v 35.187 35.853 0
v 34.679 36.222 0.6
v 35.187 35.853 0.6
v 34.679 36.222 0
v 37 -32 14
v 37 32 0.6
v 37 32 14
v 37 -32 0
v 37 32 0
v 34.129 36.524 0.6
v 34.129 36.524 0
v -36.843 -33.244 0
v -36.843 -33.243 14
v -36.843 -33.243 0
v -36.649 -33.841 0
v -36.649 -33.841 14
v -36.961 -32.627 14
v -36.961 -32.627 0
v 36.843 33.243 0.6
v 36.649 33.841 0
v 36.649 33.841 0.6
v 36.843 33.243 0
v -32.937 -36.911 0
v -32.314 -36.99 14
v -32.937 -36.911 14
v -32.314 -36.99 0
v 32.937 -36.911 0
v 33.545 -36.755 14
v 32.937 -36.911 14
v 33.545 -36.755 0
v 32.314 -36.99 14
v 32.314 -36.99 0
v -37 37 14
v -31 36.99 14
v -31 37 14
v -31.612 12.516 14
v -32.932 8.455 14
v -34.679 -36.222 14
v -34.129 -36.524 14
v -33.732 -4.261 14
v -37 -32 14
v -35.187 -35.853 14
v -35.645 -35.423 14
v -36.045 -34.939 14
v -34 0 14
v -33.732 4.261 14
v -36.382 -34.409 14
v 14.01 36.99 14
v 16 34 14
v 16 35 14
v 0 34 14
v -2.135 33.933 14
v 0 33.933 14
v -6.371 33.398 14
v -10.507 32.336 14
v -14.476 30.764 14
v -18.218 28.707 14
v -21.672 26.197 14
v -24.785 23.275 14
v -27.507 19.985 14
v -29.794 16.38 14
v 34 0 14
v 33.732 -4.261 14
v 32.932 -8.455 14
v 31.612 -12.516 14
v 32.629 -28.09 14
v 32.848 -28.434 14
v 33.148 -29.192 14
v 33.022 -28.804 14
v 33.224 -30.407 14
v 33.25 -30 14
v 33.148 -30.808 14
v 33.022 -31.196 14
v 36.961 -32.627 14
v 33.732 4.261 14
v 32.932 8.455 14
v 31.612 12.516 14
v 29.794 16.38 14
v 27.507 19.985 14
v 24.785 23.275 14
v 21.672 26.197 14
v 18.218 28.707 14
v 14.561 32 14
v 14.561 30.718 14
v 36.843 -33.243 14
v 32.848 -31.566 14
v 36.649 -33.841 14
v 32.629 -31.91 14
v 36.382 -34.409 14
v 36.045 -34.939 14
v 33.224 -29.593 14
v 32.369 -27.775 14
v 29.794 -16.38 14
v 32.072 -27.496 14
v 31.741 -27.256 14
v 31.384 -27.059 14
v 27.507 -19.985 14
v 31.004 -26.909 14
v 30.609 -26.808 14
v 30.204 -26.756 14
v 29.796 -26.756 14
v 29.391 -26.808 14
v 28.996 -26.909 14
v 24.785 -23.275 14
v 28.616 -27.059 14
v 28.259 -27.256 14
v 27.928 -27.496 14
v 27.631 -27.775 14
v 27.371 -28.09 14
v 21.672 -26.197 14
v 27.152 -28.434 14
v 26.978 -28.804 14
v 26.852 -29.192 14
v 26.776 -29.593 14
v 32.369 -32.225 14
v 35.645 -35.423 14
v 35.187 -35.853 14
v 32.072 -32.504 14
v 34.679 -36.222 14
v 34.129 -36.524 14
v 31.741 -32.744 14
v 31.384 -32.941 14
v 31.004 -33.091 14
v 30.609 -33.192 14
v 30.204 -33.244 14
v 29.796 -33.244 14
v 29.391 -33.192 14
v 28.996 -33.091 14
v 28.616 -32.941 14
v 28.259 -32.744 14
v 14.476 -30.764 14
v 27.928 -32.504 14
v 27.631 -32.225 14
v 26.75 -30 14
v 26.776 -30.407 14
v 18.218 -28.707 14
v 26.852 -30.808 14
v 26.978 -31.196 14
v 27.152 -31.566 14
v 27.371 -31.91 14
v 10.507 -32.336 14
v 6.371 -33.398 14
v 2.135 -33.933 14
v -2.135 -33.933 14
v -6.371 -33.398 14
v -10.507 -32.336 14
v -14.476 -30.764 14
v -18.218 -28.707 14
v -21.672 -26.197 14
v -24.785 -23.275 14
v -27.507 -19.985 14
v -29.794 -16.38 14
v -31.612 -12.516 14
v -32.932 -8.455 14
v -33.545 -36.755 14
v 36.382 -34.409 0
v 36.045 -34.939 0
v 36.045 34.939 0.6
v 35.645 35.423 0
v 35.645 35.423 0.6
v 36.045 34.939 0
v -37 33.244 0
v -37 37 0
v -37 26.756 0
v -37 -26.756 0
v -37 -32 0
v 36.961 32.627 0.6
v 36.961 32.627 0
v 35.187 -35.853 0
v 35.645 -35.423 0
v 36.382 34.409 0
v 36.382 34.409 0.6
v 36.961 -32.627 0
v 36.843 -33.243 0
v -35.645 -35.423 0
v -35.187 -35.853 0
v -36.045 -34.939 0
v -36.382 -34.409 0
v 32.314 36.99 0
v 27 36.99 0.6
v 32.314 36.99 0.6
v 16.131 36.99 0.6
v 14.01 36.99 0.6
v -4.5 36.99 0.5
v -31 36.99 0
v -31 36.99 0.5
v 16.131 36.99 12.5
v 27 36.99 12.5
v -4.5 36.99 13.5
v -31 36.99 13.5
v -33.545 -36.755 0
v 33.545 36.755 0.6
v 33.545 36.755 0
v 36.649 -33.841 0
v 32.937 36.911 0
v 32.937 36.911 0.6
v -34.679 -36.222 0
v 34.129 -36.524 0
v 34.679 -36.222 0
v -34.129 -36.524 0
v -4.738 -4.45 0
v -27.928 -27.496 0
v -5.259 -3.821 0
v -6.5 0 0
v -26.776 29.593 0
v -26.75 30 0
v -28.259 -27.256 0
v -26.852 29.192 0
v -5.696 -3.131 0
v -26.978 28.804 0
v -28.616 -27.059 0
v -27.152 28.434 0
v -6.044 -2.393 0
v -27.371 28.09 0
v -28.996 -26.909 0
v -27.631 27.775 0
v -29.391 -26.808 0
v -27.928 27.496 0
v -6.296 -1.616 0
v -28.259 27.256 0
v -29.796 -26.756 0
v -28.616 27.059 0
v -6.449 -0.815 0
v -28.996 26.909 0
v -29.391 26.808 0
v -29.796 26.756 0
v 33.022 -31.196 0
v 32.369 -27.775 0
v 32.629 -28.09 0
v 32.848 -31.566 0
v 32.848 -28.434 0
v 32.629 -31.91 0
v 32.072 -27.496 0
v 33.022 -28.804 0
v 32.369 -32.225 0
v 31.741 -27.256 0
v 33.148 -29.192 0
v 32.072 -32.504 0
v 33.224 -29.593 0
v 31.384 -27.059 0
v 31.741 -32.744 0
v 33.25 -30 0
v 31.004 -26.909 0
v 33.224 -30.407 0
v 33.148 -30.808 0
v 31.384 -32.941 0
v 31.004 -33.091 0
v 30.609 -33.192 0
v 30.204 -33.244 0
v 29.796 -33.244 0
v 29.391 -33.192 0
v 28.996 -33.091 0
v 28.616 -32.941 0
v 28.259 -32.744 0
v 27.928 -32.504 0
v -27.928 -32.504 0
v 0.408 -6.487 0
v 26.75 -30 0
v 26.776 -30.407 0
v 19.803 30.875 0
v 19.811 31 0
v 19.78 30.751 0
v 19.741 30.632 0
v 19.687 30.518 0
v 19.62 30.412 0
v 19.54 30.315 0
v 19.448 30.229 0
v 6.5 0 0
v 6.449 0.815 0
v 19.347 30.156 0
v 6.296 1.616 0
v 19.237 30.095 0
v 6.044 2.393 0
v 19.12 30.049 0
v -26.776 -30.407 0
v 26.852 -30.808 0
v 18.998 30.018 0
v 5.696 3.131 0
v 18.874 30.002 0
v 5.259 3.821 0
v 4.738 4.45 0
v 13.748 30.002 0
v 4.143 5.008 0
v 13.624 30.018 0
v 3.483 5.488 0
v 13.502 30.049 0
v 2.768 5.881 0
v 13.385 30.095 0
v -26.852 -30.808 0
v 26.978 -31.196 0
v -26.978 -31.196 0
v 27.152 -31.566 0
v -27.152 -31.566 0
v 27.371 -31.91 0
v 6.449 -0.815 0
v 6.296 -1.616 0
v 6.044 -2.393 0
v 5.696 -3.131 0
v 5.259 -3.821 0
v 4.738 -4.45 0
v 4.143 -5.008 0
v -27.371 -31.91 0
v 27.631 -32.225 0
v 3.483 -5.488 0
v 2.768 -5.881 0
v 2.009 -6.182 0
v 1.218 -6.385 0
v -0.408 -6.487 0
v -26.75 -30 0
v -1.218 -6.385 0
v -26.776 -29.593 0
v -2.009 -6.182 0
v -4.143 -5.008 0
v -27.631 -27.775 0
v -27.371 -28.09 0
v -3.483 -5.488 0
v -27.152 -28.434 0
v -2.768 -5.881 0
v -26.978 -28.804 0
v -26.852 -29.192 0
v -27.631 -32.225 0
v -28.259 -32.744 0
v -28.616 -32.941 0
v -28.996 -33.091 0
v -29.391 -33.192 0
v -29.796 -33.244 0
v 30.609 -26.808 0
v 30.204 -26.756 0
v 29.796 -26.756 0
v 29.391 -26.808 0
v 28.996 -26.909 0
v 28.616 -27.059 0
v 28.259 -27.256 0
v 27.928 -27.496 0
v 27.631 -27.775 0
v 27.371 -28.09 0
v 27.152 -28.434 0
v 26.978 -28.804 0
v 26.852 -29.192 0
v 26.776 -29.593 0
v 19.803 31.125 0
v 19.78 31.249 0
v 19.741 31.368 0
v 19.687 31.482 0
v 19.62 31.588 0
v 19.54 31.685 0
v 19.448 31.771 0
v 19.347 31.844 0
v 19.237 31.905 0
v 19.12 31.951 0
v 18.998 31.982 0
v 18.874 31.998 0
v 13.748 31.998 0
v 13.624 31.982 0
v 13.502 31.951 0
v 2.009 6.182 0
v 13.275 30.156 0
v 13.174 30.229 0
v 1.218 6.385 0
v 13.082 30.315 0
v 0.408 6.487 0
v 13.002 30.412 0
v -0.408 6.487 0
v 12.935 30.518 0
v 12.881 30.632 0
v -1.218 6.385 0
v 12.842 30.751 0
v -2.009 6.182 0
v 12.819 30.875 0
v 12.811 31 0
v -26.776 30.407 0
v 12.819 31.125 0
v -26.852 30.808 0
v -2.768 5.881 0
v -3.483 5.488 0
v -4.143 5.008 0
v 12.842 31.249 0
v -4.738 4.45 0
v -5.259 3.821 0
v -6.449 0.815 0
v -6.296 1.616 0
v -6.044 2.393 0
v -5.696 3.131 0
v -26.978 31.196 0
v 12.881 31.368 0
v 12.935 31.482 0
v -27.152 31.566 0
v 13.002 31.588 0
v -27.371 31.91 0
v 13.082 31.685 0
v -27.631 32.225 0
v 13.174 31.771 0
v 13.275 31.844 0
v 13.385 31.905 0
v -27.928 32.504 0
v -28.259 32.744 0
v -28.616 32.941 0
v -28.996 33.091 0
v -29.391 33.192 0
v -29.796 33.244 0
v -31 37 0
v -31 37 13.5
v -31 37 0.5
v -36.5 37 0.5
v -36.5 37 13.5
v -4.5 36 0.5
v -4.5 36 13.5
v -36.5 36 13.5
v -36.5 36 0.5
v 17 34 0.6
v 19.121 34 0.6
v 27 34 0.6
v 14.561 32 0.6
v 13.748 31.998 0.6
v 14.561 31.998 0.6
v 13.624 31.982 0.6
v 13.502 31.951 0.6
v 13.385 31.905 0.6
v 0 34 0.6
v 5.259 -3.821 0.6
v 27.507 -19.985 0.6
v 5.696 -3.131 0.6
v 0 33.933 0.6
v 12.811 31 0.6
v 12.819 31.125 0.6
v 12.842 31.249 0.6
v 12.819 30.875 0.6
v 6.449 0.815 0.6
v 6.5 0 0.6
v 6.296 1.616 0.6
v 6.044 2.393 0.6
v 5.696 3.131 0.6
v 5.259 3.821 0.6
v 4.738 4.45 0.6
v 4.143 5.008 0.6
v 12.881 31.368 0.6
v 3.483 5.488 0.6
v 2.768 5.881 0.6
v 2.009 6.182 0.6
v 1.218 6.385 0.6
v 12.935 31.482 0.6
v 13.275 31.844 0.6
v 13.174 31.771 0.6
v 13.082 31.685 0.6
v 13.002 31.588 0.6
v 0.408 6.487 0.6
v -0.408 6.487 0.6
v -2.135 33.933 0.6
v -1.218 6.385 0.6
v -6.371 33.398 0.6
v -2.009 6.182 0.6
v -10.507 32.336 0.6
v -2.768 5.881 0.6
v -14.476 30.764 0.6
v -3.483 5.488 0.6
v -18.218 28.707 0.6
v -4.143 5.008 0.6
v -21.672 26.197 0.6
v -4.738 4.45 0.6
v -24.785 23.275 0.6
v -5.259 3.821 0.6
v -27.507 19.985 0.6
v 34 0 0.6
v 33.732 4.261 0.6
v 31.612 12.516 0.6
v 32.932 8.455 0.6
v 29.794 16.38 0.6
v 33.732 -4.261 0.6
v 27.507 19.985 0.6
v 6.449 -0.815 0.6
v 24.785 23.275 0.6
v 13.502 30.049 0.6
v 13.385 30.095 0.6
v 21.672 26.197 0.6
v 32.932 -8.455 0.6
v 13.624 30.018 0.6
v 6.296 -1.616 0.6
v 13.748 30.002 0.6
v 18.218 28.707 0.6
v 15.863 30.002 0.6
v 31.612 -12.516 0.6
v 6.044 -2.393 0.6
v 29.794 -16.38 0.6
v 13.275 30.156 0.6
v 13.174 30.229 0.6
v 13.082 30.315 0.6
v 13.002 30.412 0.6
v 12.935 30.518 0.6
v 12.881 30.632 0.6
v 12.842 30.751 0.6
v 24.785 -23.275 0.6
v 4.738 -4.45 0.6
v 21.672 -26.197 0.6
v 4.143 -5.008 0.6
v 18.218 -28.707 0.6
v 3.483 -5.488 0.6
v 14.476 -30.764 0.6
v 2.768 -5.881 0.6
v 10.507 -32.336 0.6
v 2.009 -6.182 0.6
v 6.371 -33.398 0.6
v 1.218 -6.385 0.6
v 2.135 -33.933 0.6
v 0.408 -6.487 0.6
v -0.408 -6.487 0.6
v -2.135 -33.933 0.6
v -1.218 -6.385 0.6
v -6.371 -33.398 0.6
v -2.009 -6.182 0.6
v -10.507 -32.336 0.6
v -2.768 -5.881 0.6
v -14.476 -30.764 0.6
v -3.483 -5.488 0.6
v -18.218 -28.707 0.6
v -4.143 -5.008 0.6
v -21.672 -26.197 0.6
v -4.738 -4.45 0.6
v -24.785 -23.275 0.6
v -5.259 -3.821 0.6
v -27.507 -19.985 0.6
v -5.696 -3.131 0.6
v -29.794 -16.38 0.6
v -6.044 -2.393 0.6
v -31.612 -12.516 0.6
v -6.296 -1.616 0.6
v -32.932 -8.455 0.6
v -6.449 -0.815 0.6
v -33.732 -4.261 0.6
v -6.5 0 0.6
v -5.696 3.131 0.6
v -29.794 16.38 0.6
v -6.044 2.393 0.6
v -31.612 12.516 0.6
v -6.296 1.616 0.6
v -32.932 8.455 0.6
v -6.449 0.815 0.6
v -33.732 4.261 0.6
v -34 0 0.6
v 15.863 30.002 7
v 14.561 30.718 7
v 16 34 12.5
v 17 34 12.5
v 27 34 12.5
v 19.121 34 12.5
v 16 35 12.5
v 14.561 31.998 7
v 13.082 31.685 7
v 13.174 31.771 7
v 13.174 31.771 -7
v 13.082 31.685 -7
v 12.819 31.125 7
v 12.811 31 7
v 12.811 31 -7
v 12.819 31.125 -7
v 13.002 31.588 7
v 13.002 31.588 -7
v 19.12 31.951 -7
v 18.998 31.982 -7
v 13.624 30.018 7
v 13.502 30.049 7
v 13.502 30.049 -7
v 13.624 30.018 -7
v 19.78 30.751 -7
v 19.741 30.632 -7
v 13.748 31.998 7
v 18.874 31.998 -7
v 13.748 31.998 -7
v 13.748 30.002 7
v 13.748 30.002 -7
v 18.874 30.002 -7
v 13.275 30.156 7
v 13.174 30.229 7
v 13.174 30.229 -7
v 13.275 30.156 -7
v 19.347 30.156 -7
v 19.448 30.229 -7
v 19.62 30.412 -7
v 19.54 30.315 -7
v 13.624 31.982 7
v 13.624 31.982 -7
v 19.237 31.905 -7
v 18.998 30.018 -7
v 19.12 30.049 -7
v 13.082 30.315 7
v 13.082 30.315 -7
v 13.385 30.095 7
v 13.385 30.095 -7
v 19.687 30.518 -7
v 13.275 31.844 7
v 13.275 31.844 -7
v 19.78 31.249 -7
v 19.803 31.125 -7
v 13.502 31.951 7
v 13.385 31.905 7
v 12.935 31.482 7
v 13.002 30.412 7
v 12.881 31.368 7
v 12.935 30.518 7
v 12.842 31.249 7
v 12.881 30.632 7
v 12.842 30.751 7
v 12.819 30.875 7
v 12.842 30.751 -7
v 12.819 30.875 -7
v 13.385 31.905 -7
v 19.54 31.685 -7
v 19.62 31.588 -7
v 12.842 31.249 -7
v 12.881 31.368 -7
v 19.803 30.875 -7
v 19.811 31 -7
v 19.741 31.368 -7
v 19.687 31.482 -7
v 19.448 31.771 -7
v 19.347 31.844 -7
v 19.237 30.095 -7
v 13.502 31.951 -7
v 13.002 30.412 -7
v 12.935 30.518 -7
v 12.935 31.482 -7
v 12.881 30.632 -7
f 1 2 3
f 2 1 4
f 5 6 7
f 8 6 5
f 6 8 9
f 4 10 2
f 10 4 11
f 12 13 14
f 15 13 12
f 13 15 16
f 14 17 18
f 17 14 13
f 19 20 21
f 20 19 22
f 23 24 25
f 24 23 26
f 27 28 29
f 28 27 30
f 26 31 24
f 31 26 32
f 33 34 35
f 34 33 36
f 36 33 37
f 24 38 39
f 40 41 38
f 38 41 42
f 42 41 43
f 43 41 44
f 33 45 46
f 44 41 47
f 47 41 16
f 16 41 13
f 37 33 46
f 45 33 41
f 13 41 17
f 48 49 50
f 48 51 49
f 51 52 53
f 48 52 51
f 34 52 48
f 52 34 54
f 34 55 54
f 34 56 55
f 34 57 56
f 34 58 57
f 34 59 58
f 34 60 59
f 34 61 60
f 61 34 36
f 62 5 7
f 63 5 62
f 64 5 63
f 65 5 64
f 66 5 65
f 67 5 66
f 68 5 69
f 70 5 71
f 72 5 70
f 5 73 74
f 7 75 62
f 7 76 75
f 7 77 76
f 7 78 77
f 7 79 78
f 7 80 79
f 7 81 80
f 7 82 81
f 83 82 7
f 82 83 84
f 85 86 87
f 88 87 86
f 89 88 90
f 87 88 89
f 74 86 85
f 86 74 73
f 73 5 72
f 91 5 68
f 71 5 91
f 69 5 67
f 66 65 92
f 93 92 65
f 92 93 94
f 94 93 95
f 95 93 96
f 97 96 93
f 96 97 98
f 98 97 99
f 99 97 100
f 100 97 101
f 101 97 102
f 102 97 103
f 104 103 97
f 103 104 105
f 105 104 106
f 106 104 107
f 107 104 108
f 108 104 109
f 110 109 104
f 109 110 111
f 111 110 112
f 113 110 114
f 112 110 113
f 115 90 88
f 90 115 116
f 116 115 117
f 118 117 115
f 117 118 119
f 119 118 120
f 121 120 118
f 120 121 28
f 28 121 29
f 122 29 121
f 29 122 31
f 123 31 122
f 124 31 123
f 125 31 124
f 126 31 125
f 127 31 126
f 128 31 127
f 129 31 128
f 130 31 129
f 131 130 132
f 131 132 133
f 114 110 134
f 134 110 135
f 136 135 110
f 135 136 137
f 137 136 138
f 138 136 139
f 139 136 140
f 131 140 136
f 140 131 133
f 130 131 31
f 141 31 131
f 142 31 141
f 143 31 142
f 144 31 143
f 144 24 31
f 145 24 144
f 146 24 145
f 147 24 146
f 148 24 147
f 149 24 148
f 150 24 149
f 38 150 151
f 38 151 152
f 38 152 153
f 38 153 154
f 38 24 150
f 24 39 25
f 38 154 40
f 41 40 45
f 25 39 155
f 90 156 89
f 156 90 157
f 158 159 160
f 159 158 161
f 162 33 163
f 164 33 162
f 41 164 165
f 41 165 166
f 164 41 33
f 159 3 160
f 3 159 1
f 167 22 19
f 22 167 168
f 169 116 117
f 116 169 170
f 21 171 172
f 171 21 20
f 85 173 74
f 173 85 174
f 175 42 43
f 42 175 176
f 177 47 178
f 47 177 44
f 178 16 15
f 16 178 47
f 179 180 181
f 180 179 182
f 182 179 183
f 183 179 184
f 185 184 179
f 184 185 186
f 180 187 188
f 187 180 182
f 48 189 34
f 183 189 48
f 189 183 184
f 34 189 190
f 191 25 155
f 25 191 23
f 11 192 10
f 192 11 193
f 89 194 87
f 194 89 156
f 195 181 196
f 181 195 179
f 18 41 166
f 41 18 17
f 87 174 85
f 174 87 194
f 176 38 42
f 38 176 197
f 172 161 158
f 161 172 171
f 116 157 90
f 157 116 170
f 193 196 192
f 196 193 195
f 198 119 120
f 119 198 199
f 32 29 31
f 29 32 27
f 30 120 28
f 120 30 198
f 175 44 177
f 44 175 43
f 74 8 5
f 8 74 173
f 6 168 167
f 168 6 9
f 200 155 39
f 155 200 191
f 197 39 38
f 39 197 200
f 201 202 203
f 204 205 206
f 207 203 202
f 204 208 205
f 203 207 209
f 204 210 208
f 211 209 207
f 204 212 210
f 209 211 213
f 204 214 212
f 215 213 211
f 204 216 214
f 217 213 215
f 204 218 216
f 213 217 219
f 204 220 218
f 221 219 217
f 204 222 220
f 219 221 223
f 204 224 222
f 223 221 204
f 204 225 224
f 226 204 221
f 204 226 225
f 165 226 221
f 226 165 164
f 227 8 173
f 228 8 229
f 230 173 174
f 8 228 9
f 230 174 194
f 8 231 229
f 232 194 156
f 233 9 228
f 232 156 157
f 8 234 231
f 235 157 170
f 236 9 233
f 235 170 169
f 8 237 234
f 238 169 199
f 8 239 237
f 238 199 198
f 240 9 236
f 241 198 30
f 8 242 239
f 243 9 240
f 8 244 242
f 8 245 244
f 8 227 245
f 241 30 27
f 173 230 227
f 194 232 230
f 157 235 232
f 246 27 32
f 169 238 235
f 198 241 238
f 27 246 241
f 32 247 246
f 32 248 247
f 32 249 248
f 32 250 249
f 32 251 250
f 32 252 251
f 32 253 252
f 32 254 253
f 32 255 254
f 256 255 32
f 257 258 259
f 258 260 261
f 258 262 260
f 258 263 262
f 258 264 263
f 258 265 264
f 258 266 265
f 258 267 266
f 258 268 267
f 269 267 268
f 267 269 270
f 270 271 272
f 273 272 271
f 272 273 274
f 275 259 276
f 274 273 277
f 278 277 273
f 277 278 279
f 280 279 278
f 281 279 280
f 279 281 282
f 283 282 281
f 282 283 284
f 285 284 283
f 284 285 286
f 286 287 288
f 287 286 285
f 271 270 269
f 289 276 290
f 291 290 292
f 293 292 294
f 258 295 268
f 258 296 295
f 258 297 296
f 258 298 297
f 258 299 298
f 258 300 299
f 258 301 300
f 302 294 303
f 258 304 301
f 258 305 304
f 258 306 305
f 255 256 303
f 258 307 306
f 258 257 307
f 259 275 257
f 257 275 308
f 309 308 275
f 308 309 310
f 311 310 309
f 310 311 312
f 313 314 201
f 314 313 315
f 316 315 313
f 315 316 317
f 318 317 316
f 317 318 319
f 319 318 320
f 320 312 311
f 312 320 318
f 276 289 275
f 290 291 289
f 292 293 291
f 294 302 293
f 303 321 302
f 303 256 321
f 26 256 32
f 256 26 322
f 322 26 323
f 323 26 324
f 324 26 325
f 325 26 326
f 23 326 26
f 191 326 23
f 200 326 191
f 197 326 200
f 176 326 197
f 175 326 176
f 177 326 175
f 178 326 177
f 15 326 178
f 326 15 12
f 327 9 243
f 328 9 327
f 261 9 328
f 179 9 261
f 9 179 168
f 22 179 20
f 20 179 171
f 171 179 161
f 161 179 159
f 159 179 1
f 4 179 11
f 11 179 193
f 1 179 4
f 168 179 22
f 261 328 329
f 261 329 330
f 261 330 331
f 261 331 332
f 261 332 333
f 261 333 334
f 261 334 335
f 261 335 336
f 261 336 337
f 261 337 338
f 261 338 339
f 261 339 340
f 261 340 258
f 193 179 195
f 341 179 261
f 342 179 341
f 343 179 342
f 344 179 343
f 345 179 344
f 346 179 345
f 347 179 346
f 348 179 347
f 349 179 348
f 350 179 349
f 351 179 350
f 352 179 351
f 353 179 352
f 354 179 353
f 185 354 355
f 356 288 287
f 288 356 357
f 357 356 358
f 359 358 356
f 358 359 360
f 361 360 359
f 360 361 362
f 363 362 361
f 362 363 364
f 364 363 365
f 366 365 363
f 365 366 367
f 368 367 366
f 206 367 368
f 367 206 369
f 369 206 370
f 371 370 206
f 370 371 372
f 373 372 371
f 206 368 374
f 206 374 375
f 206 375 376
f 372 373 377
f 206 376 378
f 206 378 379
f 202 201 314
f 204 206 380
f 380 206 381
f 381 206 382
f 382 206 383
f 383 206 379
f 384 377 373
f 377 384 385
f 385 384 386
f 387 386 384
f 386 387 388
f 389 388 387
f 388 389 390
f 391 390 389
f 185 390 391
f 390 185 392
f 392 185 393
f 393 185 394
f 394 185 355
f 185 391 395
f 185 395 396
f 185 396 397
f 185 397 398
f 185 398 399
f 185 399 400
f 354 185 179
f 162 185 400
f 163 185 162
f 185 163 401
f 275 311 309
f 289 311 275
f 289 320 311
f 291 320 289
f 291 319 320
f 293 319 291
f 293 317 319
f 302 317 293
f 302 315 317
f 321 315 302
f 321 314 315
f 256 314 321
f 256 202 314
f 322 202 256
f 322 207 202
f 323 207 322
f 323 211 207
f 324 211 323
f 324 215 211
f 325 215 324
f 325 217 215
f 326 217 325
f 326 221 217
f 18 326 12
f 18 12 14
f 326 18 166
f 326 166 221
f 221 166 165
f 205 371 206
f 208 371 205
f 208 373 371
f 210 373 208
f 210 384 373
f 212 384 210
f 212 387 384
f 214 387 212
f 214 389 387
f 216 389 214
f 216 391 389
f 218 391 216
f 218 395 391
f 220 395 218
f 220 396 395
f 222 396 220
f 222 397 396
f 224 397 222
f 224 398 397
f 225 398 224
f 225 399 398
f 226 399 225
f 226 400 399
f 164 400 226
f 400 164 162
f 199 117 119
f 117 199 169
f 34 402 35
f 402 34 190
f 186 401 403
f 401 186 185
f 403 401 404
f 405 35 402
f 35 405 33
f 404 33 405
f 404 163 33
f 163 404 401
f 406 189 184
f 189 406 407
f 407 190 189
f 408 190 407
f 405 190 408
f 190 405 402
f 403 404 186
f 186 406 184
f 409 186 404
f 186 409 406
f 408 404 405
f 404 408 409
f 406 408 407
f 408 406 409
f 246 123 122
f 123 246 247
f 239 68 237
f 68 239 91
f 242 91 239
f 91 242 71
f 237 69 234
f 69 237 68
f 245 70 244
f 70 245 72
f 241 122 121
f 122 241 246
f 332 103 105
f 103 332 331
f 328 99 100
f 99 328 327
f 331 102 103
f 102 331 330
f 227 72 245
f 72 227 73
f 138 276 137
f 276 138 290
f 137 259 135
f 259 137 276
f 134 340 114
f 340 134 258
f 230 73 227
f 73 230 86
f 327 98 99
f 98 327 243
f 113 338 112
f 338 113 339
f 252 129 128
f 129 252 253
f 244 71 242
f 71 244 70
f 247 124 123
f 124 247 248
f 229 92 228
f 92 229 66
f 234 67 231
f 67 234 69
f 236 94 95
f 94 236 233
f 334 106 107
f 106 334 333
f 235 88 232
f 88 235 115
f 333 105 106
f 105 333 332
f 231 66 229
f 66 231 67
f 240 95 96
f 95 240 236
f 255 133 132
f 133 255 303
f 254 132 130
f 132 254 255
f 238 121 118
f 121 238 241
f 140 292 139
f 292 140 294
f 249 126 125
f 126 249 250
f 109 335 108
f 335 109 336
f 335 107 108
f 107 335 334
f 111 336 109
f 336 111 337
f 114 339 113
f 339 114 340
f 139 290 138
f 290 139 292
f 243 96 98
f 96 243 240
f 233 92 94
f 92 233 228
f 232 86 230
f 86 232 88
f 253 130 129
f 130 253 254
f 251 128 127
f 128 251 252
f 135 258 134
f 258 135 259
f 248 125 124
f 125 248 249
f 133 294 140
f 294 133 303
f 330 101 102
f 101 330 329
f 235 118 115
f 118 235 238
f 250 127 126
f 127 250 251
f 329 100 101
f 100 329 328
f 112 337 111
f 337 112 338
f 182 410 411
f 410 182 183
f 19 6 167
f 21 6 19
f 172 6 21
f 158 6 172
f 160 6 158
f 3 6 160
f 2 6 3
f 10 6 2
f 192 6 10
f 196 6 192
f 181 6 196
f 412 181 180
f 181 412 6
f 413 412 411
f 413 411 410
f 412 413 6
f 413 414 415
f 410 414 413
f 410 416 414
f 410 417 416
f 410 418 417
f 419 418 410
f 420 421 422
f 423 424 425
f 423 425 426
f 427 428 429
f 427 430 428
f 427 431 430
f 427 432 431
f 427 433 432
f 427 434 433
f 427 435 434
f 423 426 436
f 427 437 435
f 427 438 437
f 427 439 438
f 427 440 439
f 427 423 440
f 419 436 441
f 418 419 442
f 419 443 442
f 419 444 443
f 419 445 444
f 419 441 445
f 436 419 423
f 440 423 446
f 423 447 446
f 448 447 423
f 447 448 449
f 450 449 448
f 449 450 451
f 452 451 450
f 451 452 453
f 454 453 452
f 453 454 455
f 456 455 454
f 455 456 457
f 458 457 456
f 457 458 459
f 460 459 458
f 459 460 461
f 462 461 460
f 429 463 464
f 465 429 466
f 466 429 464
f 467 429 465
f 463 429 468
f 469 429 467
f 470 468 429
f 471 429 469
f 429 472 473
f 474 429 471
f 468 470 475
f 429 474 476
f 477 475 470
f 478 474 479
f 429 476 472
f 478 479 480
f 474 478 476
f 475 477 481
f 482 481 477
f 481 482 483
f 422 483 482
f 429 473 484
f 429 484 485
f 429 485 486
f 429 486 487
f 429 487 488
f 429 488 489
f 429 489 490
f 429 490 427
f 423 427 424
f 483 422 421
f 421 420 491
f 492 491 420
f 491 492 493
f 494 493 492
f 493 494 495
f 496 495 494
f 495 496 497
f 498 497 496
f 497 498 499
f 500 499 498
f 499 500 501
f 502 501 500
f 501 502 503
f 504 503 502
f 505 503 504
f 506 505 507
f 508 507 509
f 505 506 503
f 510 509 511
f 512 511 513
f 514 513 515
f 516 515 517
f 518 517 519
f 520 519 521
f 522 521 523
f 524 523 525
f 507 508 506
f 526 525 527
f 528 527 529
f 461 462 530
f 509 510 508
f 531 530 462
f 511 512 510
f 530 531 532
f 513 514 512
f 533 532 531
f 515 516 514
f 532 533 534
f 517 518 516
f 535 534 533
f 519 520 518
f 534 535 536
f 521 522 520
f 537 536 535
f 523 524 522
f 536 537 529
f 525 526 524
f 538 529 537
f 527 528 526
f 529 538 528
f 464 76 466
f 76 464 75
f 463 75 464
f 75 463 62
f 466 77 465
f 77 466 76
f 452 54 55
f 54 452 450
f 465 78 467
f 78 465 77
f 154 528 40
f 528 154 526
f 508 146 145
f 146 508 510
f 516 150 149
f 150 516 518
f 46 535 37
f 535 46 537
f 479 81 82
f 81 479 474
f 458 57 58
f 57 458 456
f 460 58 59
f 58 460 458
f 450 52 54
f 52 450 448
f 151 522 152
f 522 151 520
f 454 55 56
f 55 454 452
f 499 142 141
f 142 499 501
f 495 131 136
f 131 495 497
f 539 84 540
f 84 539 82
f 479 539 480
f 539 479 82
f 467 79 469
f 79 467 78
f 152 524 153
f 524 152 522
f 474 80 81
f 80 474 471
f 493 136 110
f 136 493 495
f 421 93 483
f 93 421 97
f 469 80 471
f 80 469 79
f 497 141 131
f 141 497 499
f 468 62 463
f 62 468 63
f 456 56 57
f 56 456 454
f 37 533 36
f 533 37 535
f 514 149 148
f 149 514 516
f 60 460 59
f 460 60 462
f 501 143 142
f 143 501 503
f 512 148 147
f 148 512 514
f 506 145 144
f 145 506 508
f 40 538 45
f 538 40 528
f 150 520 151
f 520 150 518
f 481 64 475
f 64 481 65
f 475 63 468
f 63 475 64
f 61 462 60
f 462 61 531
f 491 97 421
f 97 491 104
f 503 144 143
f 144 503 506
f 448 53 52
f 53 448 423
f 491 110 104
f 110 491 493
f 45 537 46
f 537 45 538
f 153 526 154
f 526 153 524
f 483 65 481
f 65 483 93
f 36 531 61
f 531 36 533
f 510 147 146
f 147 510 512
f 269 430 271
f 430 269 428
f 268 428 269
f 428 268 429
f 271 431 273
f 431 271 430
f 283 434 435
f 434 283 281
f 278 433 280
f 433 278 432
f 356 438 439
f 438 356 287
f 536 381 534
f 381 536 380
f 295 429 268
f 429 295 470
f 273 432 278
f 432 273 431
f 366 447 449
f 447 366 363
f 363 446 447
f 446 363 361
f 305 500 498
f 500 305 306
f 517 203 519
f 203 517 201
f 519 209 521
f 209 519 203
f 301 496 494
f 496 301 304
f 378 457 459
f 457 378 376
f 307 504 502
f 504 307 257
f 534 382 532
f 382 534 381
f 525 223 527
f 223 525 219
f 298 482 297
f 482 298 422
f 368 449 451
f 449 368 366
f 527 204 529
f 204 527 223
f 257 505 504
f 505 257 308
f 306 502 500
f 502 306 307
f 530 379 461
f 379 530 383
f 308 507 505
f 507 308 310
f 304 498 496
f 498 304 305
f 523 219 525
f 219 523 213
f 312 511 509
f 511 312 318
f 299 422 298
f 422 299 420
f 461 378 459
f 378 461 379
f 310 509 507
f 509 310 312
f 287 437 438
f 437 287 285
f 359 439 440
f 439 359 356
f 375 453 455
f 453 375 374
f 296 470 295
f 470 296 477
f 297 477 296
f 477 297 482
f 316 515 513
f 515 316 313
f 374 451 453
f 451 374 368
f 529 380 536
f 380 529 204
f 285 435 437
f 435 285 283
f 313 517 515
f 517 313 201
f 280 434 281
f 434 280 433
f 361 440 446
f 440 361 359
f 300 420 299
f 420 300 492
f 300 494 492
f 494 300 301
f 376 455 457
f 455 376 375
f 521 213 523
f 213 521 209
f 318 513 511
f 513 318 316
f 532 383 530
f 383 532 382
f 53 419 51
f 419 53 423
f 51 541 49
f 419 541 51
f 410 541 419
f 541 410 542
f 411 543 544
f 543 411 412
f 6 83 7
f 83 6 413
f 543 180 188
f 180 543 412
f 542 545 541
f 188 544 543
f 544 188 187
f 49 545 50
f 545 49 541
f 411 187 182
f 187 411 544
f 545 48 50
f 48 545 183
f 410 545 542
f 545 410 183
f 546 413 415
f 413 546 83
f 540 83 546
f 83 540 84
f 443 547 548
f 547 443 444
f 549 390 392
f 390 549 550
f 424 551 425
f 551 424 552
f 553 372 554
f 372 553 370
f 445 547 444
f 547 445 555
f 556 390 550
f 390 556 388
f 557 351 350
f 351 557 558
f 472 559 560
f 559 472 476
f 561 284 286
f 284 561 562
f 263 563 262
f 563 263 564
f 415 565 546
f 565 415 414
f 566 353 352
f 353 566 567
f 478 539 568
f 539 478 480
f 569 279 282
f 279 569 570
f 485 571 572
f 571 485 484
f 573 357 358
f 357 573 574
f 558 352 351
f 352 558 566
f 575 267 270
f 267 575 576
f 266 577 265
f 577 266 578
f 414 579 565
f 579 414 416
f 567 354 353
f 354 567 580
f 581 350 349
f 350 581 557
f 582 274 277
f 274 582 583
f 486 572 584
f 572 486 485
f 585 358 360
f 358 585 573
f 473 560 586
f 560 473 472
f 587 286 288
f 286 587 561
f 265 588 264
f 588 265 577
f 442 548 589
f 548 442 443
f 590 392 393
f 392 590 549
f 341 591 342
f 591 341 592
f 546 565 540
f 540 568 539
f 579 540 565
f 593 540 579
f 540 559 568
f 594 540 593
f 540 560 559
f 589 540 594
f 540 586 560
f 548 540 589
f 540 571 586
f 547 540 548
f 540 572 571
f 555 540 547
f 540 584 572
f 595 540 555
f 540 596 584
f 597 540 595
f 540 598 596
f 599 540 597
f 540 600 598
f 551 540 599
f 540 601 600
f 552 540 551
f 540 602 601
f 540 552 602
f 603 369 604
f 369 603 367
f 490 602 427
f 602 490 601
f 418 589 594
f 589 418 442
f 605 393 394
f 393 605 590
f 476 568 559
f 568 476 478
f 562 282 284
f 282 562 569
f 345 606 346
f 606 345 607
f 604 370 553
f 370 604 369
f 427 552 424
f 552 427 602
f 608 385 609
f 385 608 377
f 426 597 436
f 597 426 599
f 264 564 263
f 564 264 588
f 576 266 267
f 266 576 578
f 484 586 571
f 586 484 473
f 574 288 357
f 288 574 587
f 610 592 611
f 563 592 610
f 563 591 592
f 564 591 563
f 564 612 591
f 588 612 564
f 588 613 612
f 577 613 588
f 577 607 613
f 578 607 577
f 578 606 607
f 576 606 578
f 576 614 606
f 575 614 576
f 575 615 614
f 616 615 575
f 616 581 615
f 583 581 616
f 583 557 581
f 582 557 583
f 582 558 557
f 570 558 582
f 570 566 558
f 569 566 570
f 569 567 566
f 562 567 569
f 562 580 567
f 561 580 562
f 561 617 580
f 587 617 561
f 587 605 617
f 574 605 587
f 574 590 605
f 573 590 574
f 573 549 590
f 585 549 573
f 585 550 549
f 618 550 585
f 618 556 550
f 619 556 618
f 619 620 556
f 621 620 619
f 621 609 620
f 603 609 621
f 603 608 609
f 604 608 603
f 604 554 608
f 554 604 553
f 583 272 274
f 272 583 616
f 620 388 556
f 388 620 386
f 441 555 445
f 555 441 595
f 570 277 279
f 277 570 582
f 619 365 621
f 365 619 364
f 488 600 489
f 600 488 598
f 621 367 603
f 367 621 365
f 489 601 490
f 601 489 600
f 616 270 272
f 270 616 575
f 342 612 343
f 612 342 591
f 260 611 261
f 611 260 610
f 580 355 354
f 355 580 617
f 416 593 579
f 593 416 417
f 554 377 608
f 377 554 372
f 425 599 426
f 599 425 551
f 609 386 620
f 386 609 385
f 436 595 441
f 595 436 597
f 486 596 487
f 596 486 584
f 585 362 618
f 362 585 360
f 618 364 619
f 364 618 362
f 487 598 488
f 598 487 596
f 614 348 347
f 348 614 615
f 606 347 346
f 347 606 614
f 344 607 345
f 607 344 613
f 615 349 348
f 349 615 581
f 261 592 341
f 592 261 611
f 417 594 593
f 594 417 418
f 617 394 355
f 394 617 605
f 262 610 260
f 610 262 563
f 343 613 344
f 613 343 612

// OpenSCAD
$fn = 50;


union() {
	difference() {
		union() {
			hull() {
				translate(v = [-32.0000000000, 32.0000000000, 0]) {
					cylinder(h = 14, r = 5);
				}
				translate(v = [32.0000000000, 32.0000000000, 0]) {
					cylinder(h = 14, r = 5);
				}
				translate(v = [-32.0000000000, -32.0000000000, 0]) {
					cylinder(h = 14, r = 5);
				}
				translate(v = [32.0000000000, -32.0000000000, 0]) {
					cylinder(h = 14, r = 5);
				}
			}
			translate(v = [-37.0000000000, 31.0000000000, 0]) {
				cube(size = [6, 6, 14]);
			}
		}
		union() {
			translate(v = [-37.5000000000, -30.0000000000, -250.0000000000]) {
				rotate(a = [0, 0, 0]) {
					difference() {
						union() {
							hull() {
								translate(v = [7.5000000000, 0, 0]) {
									cylinder(h = 250, r = 3.2500000000, r1 = 3.2500000000, r2 = 3.2500000000);
								}
								translate(v = [-7.5000000000, 0, 0]) {
									cylinder(h = 250, r = 3.2500000000, r1 = 3.2500000000, r2 = 3.2500000000);
								}
							}
						}
						union();
					}
				}
			}
			translate(v = [-37.5000000000, 30.0000000000, -250.0000000000]) {
				rotate(a = [0, 0, 0]) {
					difference() {
						union() {
							hull() {
								translate(v = [7.5000000000, 0, 0]) {
									cylinder(h = 250, r = 3.2500000000, r1 = 3.2500000000, r2 = 3.2500000000);
								}
								translate(v = [-7.5000000000, 0, 0]) {
									cylinder(h = 250, r = 3.2500000000, r1 = 3.2500000000, r2 = 3.2500000000);
								}
							}
						}
						union();
					}
				}
			}
			translate(v = [-36.5000000000, 36.0000000000, 0.5000000000]) {
				cube(size = [32, 1, 13.0000000000]);
			}
			translate(v = [30.0000000000, -30.0000000000, 0]) {
				cylinder(h = 100, r = 3.2500000000);
			}
			translate(v = [0, 0, 0.6000000000]) {
				cylinder(h = 16.4000000000, r = 34.0000000000);
			}
			translate(v = [0, 0, -7.0000000000]) {
				cylinder(h = 14, r = 6.5000000000);
			}
			translate(v = [0.0000000000, 32.0000000000, 0.6000000000]) {
				cube(size = [37.0000000000, 2, 16.4000000000]);
			}
			translate(v = [27.0000000000, 32.0000000000, 0.6000000000]) {
				cube(size = [10, 5, 16.4000000000]);
			}
			translate(v = [16.0000000000, 32.0000000000, 12.5000000000]) {
				cube(size = [21, 5, 1.5000000000]);
			}
			translate(v = [13.2500000000, 37.7500000000, 0.6000000000]) {
				rotate(a = [0, 0, -45]) {
					cube(size = [7.5000000000, 1.5000000000, 16.4000000000]);
				}
			}
			translate(v = [7.0610000000, 30.0000000000, 0.6000000000]) {
				cube(size = [7.5000000000, 2, 13.4000000000]);
			}
		}
	}
	union() {
		translate(v = [16.3110000000, 31.0000000000, -7.0000000000]) {
			rotate(a = [0, 0, 0]) {
				difference() {
					union() {
						#hull() {
							#translate(v = [2.5000000000, 0, 0]) {
								cylinder(h = 14, r = 1.0000000000, r1 = 1.0000000000, r2 = 1.0000000000);
							}
							#translate(v = [-2.5000000000, 0, 0]) {
								cylinder(h = 14, r = 1.0000000000, r1 = 1.0000000000, r2 = 1.0000000000);
							}
						}
					}
					union();
				}
			}
		}
	}
}
